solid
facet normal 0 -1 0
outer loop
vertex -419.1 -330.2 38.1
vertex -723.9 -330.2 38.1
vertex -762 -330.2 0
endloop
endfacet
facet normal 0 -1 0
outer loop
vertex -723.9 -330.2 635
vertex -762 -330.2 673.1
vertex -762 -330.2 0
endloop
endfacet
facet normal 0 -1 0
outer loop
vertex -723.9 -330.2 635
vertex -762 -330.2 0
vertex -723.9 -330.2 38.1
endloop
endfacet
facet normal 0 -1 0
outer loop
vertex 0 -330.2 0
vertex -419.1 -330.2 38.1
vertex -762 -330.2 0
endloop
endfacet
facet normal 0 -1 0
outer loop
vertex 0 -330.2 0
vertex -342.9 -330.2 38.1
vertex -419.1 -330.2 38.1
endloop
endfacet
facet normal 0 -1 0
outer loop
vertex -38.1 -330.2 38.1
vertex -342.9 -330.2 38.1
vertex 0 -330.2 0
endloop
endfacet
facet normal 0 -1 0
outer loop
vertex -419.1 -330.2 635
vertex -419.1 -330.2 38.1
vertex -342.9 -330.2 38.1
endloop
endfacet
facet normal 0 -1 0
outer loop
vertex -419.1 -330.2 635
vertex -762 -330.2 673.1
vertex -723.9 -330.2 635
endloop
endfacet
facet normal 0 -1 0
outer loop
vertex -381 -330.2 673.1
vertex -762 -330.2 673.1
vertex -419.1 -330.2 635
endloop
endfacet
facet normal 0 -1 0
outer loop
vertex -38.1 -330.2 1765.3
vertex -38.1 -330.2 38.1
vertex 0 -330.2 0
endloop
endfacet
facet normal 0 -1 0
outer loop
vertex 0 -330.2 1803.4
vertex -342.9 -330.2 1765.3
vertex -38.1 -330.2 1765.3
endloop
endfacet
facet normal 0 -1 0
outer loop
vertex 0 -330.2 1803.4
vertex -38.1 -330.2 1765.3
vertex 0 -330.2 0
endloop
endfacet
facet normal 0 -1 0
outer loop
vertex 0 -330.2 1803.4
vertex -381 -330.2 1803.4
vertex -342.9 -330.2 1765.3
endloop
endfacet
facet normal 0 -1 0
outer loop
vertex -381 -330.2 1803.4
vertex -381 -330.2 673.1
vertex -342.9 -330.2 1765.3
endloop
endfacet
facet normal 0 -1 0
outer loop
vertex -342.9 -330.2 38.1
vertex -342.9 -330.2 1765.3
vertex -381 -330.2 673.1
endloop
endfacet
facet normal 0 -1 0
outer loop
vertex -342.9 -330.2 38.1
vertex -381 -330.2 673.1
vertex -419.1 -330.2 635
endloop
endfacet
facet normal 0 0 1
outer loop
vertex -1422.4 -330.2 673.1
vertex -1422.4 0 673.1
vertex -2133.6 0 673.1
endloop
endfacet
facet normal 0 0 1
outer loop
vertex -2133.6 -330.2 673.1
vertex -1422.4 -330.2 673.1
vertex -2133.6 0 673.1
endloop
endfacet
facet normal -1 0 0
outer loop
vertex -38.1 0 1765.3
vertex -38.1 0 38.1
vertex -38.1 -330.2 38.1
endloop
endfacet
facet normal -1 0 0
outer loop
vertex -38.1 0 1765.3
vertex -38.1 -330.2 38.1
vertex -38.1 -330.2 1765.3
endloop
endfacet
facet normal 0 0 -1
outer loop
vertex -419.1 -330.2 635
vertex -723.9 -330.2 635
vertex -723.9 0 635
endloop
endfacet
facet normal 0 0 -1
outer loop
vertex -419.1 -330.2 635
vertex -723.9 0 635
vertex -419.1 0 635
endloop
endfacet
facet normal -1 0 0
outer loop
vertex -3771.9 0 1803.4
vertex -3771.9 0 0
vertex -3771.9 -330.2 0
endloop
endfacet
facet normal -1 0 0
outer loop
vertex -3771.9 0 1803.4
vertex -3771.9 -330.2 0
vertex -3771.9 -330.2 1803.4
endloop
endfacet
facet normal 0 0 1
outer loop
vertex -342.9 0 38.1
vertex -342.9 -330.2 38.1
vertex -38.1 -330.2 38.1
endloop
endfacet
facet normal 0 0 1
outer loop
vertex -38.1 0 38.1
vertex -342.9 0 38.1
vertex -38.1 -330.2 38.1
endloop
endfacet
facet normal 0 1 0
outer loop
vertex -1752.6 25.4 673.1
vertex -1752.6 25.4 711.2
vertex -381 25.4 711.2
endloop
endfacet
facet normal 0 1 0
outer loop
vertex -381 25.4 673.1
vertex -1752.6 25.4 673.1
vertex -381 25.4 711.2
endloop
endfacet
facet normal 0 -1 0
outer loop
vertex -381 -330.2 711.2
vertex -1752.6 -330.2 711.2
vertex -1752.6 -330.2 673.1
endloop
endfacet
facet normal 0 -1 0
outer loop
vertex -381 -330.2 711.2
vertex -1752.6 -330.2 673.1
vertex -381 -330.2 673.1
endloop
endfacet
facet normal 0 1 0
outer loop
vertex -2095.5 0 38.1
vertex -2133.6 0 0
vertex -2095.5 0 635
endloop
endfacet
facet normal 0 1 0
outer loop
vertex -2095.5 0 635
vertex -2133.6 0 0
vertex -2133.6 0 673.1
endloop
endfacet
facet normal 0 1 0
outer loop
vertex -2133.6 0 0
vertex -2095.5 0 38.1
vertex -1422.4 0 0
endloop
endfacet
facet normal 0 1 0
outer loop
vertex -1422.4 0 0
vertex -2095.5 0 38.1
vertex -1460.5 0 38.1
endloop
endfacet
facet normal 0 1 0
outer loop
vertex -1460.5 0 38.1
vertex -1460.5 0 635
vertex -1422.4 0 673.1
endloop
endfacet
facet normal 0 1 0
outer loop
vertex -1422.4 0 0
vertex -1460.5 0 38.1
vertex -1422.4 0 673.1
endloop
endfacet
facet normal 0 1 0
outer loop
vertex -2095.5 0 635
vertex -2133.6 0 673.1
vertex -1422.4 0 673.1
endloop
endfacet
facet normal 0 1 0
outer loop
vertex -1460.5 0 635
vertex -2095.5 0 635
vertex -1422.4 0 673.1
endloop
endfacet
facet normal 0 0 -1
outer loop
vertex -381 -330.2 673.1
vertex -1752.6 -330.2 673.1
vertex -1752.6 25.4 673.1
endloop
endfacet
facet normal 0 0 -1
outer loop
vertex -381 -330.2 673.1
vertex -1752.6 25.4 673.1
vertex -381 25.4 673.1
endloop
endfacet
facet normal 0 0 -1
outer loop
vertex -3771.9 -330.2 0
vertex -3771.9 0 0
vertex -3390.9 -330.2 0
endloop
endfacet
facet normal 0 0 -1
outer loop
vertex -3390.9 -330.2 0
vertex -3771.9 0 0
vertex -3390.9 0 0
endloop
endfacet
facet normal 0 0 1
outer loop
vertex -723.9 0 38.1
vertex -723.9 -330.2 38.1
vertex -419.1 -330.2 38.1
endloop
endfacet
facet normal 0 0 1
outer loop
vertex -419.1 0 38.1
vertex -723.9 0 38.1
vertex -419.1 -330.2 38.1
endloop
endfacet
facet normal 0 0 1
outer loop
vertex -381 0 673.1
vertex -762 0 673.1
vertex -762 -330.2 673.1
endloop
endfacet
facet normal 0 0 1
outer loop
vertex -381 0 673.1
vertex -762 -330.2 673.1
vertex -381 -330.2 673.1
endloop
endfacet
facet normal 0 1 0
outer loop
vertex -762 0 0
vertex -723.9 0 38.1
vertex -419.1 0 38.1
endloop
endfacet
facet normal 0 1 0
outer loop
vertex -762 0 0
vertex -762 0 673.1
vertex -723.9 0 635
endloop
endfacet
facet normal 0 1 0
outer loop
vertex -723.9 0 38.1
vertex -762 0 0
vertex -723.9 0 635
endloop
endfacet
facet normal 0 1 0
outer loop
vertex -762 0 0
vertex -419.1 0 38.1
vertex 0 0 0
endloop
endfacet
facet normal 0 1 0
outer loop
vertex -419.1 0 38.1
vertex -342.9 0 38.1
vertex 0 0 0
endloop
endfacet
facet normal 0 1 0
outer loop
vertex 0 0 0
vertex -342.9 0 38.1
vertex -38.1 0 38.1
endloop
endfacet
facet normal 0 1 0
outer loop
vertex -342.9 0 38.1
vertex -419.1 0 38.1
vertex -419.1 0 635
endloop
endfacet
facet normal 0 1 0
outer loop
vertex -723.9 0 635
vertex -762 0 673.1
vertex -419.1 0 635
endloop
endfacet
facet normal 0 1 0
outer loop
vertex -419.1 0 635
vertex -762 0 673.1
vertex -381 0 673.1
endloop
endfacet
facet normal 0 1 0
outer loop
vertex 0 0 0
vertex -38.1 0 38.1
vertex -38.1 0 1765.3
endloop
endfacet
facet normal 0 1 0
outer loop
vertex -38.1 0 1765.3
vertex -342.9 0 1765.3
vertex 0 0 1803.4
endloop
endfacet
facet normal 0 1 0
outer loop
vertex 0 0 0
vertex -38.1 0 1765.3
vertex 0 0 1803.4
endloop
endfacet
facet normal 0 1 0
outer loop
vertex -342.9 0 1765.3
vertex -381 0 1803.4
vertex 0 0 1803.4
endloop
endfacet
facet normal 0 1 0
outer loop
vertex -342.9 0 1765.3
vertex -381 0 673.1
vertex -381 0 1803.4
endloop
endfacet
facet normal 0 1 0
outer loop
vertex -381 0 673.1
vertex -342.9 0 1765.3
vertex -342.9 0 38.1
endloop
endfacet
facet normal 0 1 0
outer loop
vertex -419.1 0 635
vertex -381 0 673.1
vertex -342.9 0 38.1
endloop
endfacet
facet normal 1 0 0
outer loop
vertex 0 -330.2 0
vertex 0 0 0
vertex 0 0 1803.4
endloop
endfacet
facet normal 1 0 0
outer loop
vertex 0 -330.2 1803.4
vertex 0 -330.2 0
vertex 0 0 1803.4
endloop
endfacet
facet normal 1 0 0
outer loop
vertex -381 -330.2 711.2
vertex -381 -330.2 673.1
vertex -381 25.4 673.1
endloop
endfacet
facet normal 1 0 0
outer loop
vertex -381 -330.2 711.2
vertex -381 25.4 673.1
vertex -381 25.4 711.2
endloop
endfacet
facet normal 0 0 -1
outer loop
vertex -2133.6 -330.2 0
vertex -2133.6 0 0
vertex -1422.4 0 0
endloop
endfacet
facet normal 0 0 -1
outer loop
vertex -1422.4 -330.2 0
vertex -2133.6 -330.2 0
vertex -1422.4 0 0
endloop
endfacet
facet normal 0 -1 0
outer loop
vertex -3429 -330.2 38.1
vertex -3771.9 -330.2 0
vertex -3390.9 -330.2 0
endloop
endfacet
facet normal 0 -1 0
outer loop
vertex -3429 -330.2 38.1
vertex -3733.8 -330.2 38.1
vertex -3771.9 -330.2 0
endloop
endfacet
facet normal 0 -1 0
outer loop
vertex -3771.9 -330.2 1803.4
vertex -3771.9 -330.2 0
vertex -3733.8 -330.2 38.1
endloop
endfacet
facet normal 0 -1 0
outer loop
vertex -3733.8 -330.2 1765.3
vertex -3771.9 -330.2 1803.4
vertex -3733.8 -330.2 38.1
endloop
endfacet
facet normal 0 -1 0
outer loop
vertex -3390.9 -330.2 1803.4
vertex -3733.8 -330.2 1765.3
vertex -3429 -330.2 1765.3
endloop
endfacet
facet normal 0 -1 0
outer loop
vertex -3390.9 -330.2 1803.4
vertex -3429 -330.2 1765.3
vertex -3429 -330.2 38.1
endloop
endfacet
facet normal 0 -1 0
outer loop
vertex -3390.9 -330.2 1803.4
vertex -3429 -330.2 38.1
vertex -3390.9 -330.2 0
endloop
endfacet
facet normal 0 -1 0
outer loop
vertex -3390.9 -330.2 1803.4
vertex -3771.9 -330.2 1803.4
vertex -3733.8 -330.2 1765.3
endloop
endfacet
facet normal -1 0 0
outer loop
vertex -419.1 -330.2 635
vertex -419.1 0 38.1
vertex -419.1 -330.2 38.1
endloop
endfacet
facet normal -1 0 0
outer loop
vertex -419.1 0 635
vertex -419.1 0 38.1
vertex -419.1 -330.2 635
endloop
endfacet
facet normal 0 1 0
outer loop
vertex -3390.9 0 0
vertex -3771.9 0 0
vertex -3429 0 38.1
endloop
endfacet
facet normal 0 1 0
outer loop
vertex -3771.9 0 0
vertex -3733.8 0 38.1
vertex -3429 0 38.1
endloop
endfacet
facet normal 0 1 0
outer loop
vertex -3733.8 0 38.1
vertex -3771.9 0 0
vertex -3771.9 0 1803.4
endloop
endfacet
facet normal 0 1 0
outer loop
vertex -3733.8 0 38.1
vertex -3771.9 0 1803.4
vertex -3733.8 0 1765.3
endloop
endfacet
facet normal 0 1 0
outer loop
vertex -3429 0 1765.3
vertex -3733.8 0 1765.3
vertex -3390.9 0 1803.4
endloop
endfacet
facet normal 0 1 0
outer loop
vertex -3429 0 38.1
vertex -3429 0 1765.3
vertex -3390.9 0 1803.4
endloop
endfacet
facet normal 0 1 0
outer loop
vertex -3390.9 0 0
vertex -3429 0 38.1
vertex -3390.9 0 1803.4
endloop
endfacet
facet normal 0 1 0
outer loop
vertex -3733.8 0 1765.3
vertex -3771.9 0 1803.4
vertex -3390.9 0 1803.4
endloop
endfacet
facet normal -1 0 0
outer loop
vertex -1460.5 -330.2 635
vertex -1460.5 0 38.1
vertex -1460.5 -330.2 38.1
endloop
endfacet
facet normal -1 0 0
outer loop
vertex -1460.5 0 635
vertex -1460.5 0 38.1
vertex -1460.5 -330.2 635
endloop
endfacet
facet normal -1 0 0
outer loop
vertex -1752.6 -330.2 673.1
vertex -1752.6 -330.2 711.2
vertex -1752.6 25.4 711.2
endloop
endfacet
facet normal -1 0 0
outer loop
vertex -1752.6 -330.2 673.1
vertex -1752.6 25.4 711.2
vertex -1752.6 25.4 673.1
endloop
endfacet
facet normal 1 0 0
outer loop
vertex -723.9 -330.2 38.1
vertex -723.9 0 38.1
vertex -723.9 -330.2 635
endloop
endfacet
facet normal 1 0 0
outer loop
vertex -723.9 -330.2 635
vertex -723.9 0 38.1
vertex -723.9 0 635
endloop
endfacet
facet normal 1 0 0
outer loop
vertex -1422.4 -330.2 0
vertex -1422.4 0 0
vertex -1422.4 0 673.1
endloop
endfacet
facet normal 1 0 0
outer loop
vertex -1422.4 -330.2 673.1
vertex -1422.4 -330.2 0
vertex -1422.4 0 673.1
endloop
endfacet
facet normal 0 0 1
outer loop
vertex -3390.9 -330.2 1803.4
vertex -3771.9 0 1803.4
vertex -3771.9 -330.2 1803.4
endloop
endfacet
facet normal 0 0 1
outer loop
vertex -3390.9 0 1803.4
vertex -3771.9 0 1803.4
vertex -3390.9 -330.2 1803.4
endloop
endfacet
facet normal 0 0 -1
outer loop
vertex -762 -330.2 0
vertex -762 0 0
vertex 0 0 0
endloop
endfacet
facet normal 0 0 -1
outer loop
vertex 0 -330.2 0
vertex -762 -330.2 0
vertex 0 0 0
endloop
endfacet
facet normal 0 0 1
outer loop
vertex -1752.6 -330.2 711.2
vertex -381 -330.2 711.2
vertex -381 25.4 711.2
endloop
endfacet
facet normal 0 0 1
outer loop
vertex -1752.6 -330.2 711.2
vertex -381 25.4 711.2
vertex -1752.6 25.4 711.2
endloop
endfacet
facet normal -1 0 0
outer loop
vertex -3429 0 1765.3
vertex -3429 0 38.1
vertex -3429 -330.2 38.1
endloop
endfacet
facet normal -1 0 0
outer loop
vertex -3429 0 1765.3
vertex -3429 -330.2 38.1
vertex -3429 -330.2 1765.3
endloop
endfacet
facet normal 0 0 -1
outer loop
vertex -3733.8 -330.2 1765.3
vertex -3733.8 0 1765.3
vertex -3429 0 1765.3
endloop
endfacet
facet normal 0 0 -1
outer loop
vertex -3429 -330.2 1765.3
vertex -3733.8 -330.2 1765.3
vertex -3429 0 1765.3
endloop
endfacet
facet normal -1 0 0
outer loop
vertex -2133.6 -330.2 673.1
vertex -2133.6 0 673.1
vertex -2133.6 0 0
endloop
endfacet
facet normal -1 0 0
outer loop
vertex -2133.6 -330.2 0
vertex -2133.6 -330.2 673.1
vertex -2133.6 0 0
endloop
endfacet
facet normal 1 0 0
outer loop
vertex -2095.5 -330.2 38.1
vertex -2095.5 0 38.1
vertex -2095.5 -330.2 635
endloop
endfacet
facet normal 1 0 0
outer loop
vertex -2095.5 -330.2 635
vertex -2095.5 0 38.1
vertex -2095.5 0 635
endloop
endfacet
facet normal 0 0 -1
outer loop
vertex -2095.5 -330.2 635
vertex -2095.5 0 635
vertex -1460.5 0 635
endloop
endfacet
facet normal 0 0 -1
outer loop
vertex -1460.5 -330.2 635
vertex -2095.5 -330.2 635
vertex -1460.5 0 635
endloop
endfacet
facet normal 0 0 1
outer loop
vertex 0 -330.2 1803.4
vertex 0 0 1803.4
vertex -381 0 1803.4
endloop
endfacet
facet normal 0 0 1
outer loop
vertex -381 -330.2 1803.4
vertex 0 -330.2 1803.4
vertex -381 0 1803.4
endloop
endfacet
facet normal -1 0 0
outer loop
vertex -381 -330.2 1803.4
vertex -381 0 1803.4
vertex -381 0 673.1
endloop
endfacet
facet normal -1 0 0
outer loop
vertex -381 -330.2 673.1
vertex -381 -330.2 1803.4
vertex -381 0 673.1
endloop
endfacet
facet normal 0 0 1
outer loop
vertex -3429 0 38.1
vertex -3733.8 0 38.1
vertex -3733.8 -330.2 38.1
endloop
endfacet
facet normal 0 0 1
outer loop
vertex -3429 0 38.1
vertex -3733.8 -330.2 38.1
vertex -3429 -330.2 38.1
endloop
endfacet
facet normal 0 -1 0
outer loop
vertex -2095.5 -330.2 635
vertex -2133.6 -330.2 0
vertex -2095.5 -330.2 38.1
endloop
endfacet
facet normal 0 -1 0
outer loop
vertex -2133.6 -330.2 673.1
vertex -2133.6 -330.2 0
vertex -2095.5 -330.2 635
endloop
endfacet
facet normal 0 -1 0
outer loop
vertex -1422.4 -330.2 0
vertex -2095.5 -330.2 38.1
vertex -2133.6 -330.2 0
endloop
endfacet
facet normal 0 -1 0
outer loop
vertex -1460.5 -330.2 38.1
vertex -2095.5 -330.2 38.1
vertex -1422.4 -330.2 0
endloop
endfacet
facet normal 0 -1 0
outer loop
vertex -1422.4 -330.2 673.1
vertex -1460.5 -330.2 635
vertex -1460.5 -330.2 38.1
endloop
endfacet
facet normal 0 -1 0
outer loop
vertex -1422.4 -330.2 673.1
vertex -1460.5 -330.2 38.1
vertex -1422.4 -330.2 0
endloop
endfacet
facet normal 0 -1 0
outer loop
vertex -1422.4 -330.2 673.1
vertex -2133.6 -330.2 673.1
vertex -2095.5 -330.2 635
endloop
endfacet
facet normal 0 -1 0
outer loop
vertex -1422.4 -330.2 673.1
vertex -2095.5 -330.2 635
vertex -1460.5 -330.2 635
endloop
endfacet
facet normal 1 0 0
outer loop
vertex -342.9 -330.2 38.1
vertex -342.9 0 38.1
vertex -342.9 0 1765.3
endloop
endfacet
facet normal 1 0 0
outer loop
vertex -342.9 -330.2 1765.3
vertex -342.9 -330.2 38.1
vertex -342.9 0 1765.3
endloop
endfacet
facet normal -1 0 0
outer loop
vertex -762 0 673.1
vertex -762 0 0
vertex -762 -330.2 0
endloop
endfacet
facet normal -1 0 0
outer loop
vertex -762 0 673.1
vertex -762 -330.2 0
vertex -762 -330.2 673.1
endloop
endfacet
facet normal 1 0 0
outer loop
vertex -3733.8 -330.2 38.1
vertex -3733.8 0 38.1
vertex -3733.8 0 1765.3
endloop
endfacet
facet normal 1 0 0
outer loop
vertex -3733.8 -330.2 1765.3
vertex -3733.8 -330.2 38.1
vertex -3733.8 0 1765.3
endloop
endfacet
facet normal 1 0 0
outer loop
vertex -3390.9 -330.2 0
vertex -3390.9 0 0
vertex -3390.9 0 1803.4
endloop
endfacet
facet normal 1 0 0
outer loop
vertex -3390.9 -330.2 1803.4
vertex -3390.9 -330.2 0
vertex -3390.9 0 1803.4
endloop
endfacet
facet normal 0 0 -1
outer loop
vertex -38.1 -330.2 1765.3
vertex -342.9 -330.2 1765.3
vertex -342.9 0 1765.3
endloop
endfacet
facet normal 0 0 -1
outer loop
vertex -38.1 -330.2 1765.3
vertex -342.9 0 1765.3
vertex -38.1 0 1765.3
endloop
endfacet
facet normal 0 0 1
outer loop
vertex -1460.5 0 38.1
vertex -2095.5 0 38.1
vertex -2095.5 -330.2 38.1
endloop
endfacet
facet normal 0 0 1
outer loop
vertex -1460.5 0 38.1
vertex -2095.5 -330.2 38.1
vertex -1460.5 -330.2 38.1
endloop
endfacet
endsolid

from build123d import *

# Parameters (mm, degrees)
F0_W     = 381
F0_H     = 1803.4
F0_W_2   = 304.8
F0_H_2   = 1727.2
F1_DEPTH = 330.2
F0_W_3   = 635
F0_H_3   = 596.9
F0_H_4   = 673.1
F3_DEPTH = 355.6


# Not quite as in the source:
# - a feature names something its author has since deleted; it is built from what else it names


with BuildPart() as f1:
    # F0 (on Front) → F1 (new body)
    with BuildSketch(Plane.XZ):
        with Locations((-3581.4, 901.7)):
            Rectangle(F0_W, F0_H)
        with Locations((-3581.4, 901.7)):
            Rectangle(F0_W_2, F0_H_2, mode=Mode.SUBTRACT)
    extrude(amount=F1_DEPTH)


with BuildPart() as f1b:
    # F0 (on Front) → F1, piece 2 (new body)
    with BuildSketch(Plane.XZ):
        Polygon((-2133.6, 673.1), (-2133.6, 0), (-1752.6, 0), (-1422.4, 0), (-1422.4, 673.1), (-1752.6, 673.1), (-1790.7, 673.1), (-2095.5, 673.1), align=None)
        with Locations((-1778, 336.55)):
            Rectangle(F0_W_3, F0_H_3, mode=Mode.SUBTRACT)
    extrude(amount=F1_DEPTH)


with BuildPart() as f1c:
    # F0 (on Front) → F1, piece 3 (new body)
    with BuildSketch(Plane.XZ):
        with Locations((-571.5, 336.55)):
            Rectangle(F0_W, F0_H_4)
        with Locations((-571.5, 336.55)):
            Rectangle(F0_W_2, F0_H_3, mode=Mode.SUBTRACT)
        Polygon((-38.1, 0), (0, 0), (0, 1803.4), (-38.1, 1803.4), (-342.9, 1803.4), (-381, 1803.4), (-381, 673.1), (-381, 0), (-342.9, 0), align=None)
        with Locations((-190.5, 901.7)):
            Rectangle(F0_W_2, F0_H_2, mode=Mode.SUBTRACT)
    extrude(amount=F1_DEPTH)


with BuildPart() as f3:
    # F2 (on face) → F3 (new body)
    with BuildSketch(Plane.XZ.offset(330.2)):
        Polygon((-1752.6, 711.2), (-1752.6, 673.1), (-1422.4, 673.1), (-381, 673.1), (-381, 711.2), align=None)
    extrude(amount=-F3_DEPTH)


solid = Compound([f1.part, f1b.part, f1c.part, f3.part])
